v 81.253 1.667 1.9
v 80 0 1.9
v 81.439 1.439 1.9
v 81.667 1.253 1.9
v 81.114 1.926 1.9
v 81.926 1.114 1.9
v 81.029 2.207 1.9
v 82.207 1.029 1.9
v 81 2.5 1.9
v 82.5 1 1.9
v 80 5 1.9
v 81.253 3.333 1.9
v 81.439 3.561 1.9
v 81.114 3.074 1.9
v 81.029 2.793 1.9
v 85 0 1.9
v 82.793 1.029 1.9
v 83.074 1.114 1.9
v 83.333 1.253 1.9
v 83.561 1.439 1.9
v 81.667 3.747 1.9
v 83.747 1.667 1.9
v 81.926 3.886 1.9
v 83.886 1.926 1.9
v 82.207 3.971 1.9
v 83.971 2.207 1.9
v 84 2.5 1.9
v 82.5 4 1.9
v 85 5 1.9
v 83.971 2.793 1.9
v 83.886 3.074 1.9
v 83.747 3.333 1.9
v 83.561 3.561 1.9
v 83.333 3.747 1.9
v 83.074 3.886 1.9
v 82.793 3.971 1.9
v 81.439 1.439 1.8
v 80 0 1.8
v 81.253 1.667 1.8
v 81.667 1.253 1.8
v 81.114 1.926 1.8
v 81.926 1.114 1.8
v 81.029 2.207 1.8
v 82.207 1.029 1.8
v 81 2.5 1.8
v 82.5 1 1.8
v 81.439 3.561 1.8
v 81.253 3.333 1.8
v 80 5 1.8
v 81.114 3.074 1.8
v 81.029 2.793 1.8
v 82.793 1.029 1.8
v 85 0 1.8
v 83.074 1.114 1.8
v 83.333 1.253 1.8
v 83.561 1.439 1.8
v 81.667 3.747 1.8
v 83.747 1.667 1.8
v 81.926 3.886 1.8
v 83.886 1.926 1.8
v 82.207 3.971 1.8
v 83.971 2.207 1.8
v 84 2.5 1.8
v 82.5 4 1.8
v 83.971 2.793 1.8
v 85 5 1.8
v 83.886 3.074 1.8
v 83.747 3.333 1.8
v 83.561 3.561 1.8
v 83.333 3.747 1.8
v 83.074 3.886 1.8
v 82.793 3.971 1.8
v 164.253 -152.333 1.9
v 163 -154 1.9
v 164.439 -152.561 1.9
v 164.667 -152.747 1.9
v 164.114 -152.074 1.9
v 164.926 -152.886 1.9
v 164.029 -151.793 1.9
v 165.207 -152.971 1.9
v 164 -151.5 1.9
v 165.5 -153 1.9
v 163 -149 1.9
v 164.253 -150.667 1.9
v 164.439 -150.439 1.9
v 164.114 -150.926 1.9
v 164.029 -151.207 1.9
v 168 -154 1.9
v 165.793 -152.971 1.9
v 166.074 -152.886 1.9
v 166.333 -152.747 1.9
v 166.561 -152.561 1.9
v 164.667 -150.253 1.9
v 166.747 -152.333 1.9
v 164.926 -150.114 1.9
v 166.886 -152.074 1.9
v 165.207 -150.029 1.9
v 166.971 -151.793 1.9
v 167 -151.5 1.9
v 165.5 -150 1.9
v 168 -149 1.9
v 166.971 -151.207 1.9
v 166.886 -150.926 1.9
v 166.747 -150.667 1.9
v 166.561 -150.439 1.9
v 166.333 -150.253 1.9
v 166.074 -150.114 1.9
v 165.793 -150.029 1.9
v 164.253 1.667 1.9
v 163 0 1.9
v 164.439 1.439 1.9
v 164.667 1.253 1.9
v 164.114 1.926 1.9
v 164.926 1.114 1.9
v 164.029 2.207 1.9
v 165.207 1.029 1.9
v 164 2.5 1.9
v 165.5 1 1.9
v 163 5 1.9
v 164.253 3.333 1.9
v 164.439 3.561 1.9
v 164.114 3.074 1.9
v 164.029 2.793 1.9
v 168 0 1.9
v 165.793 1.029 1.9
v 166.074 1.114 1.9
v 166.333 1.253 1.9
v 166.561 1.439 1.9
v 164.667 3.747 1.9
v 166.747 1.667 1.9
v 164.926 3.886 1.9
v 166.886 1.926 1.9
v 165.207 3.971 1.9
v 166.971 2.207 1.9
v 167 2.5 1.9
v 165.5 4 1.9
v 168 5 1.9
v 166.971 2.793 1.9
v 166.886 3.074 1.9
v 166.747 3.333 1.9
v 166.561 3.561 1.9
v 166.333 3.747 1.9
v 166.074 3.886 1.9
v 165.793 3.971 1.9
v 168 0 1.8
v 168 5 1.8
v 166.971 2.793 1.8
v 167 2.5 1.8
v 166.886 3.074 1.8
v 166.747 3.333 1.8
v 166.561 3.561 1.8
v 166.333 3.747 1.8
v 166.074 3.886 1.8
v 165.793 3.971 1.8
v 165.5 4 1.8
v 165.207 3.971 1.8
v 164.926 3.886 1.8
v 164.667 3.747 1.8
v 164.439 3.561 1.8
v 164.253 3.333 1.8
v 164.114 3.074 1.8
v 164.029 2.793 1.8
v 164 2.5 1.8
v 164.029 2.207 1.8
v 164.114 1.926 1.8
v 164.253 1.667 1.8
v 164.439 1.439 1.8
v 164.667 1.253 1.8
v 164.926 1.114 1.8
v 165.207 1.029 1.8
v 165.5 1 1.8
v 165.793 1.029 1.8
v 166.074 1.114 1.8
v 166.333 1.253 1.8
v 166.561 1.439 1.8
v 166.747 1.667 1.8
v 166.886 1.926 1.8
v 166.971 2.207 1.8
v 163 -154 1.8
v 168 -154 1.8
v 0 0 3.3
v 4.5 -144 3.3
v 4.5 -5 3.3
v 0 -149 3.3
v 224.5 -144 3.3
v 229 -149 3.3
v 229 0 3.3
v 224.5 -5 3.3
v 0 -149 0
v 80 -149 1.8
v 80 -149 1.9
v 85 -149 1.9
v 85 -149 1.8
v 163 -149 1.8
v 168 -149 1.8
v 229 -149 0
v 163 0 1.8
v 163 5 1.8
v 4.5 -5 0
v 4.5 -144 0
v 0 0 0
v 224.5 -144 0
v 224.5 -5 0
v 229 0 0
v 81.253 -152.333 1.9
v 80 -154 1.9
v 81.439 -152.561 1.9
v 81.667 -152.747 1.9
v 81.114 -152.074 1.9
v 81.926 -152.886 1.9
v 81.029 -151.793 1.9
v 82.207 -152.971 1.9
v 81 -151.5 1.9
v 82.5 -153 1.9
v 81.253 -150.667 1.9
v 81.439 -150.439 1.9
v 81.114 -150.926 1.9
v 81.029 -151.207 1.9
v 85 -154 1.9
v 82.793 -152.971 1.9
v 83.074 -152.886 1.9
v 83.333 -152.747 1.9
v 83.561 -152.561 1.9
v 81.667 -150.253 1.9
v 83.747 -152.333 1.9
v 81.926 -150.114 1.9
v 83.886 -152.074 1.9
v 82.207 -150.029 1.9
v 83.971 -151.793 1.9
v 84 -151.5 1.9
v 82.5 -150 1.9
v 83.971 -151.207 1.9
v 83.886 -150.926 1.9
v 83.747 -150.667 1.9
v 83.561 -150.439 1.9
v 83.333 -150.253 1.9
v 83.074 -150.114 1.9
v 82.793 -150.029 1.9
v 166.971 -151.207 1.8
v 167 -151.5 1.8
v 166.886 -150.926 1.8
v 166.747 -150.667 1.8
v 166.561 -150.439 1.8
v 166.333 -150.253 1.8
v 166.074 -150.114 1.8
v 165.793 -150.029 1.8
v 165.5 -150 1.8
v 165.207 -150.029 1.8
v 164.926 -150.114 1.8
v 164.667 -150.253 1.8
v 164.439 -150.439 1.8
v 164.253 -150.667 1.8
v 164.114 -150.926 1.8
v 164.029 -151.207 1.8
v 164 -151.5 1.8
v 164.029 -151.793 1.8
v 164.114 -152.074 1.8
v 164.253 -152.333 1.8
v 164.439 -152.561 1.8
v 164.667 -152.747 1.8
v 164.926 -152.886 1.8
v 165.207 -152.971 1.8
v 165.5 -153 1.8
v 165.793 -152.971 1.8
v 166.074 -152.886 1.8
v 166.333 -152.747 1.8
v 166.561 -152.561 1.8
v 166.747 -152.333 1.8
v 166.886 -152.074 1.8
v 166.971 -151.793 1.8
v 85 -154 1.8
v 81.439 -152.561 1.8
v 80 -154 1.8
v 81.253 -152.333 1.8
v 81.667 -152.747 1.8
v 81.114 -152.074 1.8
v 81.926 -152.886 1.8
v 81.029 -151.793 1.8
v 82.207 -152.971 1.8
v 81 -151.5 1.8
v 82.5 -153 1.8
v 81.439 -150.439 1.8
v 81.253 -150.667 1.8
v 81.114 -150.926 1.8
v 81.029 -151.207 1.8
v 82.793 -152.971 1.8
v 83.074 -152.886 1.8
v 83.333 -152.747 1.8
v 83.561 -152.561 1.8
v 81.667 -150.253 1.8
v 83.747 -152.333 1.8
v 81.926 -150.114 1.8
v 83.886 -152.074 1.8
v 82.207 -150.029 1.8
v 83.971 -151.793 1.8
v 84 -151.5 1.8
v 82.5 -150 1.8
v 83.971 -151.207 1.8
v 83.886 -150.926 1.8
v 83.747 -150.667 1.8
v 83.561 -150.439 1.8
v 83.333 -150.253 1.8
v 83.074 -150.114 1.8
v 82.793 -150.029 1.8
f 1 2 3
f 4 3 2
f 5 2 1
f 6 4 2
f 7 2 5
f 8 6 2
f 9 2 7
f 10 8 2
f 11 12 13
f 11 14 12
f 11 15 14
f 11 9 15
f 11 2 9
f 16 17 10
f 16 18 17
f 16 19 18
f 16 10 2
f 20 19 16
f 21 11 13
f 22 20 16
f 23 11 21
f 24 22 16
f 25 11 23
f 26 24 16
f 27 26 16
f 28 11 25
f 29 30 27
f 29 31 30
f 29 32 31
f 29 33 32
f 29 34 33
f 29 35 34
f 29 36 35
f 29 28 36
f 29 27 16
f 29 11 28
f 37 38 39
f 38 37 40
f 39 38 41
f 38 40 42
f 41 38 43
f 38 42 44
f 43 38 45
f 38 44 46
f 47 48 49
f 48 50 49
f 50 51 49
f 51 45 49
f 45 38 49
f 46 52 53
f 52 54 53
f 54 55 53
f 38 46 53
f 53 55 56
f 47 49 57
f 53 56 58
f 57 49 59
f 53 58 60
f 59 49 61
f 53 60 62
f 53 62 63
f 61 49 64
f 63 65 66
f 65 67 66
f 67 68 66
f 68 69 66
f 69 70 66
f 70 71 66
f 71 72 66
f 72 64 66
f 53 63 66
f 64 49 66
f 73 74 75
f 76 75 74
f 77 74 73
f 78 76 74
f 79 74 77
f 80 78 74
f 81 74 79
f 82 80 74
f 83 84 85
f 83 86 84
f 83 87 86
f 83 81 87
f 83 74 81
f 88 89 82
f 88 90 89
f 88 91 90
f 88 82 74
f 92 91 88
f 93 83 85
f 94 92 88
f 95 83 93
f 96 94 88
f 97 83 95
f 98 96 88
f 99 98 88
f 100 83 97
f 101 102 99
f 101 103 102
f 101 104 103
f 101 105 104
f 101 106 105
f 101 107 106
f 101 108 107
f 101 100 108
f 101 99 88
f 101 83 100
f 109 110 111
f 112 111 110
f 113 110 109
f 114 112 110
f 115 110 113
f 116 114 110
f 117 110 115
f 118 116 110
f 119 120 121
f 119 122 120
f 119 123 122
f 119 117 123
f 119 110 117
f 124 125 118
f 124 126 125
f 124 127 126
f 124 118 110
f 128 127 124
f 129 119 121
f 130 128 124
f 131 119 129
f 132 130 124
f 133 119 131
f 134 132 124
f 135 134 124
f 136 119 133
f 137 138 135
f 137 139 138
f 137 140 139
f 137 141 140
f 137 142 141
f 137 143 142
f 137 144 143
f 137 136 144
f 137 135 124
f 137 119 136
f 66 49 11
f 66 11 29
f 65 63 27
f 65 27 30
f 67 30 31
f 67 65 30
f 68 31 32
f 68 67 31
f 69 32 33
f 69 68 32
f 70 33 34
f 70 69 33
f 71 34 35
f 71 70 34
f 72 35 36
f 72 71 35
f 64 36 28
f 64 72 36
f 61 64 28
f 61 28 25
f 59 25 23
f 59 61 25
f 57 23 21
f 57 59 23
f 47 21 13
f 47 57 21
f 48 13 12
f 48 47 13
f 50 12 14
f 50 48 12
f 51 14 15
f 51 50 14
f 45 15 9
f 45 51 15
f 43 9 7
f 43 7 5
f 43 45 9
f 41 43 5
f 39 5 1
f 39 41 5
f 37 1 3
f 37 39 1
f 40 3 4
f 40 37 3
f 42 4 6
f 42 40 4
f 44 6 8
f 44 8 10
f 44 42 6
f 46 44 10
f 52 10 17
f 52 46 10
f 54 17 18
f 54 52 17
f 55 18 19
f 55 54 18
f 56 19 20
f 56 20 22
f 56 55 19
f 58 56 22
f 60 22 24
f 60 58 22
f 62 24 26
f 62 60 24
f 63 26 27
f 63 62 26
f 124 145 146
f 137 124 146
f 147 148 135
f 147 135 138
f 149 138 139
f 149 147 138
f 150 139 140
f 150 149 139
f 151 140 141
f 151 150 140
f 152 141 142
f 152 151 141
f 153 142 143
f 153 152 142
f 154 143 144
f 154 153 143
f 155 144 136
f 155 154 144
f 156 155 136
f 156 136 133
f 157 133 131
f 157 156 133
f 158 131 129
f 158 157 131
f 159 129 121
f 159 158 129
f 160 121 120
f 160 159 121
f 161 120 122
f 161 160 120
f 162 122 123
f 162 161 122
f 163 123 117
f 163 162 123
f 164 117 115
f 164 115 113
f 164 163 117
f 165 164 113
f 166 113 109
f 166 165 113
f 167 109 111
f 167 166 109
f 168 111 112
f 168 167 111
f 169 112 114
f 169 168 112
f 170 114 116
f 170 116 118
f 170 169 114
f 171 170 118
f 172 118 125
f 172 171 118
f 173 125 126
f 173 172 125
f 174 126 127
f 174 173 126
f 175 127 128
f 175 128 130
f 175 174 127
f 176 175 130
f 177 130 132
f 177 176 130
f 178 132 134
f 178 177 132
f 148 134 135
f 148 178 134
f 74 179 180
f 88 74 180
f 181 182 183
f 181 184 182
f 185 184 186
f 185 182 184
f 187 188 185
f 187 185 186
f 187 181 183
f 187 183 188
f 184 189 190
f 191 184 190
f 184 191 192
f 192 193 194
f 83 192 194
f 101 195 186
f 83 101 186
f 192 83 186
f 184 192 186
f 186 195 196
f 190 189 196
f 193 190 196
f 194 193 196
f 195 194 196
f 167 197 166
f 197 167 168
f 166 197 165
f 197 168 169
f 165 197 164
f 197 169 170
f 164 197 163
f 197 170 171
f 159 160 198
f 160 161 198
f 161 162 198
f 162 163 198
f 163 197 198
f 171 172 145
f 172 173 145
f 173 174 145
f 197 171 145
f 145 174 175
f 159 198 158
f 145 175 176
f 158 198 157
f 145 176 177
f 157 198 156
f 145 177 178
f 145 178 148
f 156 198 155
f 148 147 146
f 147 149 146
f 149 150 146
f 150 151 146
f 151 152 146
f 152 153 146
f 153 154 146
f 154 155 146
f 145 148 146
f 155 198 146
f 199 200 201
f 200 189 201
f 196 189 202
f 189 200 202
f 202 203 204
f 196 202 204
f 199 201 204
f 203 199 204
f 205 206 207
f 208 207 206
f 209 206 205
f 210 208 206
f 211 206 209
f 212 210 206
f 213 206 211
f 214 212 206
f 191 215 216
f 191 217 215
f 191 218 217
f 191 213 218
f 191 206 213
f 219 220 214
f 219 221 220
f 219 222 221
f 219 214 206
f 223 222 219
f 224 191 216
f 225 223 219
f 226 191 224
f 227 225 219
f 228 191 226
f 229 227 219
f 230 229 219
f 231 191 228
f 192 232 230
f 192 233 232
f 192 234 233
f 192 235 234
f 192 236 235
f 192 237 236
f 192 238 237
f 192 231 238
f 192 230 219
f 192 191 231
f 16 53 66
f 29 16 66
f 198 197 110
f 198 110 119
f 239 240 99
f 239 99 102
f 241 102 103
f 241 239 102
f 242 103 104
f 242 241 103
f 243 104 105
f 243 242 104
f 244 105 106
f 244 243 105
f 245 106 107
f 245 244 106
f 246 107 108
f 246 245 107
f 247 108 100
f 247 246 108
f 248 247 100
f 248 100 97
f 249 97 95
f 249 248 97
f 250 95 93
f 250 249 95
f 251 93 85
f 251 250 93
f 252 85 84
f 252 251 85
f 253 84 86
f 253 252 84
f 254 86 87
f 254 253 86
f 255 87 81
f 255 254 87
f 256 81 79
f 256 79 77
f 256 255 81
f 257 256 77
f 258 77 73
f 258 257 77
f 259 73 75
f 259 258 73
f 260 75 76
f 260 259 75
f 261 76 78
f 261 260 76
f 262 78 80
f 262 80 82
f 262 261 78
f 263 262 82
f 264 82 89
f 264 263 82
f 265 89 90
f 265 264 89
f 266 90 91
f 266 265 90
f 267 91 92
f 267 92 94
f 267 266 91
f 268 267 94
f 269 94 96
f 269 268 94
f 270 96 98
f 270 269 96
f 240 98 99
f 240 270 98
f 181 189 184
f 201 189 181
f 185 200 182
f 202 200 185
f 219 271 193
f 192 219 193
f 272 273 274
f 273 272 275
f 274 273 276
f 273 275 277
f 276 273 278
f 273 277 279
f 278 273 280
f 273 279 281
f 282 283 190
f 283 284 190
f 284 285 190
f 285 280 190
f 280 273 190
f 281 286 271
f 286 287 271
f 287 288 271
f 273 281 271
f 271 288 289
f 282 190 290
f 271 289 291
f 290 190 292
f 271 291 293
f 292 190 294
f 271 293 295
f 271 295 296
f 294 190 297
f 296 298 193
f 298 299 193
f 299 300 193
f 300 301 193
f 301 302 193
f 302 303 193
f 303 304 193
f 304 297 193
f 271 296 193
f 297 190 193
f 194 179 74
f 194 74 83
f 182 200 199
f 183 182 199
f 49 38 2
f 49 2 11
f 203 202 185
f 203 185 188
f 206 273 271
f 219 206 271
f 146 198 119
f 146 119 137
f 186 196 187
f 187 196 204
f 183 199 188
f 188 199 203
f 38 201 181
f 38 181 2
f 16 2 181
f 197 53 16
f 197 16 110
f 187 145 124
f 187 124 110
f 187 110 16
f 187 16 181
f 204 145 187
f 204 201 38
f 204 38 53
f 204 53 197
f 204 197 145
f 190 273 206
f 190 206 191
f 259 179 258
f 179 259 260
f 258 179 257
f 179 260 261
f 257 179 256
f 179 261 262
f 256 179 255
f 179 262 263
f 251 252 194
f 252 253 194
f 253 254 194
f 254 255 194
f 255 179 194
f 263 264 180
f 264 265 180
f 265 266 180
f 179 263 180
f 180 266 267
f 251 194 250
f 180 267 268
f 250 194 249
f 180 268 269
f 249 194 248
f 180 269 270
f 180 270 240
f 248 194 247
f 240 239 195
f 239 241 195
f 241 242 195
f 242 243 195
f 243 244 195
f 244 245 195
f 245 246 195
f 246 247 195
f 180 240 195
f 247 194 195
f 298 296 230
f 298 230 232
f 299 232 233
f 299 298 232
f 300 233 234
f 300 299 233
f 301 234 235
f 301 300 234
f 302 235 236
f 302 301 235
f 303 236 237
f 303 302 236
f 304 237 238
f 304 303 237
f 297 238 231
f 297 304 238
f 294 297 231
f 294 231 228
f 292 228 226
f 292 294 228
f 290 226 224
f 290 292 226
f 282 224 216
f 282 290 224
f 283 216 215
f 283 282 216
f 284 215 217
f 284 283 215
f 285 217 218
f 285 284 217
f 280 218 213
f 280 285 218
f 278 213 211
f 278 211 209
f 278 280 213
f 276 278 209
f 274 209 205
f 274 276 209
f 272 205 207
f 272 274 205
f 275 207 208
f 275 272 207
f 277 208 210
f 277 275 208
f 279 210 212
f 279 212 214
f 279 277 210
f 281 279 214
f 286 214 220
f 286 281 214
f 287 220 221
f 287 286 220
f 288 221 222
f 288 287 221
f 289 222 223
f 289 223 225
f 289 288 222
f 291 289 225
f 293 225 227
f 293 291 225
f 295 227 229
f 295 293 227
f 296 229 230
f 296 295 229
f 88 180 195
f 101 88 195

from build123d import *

# Parameters (mm, degrees)
F0_W     = 229
F0_H     = 149
F0_W_2   = 220
F0_H_2   = 139
F1_DEPTH = 3.3
F3_W     = 5
F3_H     = 5
F3_R     = 1.5
F4_DEPTH = 0.1


# Not quite as in the source:
# - a feature names something its author has since deleted; it is built from what else it names


with BuildPart() as f1:
    # F0 (on Top) → F1 (new body)
    with BuildSketch(Plane.XY):
        with Locations((114.5, -74.5)):
            Rectangle(F0_W, F0_H)
        with Locations((114.5, -74.5)):
            Rectangle(F0_W_2, F0_H_2, mode=Mode.SUBTRACT)
    extrude(amount=F1_DEPTH)

    # F3 (on offset) → F4 (join)
    with BuildSketch(Plane.XY.offset(1.8)):
        with Locations((165.5, 2.5)):
            Rectangle(F3_W, F3_H)
        with Locations((165.5, 2.5)):
            Circle(F3_R, mode=Mode.SUBTRACT)
        with Locations((82.5, -151.5)):
            Rectangle(F3_W, F3_H)
        with Locations((82.5, -151.5)):
            Circle(F3_R, mode=Mode.SUBTRACT)
        with Locations((165.5, -151.5)):
            Rectangle(F3_W, F3_H)
        with Locations((165.5, -151.5)):
            Circle(F3_R, mode=Mode.SUBTRACT)
        with Locations((82.5, 2.5)):
            Rectangle(F3_W, F3_H)
        with Locations((82.5, 2.5)):
            Circle(F3_R, mode=Mode.SUBTRACT)
    extrude(amount=F4_DEPTH)


solid = f1.part
